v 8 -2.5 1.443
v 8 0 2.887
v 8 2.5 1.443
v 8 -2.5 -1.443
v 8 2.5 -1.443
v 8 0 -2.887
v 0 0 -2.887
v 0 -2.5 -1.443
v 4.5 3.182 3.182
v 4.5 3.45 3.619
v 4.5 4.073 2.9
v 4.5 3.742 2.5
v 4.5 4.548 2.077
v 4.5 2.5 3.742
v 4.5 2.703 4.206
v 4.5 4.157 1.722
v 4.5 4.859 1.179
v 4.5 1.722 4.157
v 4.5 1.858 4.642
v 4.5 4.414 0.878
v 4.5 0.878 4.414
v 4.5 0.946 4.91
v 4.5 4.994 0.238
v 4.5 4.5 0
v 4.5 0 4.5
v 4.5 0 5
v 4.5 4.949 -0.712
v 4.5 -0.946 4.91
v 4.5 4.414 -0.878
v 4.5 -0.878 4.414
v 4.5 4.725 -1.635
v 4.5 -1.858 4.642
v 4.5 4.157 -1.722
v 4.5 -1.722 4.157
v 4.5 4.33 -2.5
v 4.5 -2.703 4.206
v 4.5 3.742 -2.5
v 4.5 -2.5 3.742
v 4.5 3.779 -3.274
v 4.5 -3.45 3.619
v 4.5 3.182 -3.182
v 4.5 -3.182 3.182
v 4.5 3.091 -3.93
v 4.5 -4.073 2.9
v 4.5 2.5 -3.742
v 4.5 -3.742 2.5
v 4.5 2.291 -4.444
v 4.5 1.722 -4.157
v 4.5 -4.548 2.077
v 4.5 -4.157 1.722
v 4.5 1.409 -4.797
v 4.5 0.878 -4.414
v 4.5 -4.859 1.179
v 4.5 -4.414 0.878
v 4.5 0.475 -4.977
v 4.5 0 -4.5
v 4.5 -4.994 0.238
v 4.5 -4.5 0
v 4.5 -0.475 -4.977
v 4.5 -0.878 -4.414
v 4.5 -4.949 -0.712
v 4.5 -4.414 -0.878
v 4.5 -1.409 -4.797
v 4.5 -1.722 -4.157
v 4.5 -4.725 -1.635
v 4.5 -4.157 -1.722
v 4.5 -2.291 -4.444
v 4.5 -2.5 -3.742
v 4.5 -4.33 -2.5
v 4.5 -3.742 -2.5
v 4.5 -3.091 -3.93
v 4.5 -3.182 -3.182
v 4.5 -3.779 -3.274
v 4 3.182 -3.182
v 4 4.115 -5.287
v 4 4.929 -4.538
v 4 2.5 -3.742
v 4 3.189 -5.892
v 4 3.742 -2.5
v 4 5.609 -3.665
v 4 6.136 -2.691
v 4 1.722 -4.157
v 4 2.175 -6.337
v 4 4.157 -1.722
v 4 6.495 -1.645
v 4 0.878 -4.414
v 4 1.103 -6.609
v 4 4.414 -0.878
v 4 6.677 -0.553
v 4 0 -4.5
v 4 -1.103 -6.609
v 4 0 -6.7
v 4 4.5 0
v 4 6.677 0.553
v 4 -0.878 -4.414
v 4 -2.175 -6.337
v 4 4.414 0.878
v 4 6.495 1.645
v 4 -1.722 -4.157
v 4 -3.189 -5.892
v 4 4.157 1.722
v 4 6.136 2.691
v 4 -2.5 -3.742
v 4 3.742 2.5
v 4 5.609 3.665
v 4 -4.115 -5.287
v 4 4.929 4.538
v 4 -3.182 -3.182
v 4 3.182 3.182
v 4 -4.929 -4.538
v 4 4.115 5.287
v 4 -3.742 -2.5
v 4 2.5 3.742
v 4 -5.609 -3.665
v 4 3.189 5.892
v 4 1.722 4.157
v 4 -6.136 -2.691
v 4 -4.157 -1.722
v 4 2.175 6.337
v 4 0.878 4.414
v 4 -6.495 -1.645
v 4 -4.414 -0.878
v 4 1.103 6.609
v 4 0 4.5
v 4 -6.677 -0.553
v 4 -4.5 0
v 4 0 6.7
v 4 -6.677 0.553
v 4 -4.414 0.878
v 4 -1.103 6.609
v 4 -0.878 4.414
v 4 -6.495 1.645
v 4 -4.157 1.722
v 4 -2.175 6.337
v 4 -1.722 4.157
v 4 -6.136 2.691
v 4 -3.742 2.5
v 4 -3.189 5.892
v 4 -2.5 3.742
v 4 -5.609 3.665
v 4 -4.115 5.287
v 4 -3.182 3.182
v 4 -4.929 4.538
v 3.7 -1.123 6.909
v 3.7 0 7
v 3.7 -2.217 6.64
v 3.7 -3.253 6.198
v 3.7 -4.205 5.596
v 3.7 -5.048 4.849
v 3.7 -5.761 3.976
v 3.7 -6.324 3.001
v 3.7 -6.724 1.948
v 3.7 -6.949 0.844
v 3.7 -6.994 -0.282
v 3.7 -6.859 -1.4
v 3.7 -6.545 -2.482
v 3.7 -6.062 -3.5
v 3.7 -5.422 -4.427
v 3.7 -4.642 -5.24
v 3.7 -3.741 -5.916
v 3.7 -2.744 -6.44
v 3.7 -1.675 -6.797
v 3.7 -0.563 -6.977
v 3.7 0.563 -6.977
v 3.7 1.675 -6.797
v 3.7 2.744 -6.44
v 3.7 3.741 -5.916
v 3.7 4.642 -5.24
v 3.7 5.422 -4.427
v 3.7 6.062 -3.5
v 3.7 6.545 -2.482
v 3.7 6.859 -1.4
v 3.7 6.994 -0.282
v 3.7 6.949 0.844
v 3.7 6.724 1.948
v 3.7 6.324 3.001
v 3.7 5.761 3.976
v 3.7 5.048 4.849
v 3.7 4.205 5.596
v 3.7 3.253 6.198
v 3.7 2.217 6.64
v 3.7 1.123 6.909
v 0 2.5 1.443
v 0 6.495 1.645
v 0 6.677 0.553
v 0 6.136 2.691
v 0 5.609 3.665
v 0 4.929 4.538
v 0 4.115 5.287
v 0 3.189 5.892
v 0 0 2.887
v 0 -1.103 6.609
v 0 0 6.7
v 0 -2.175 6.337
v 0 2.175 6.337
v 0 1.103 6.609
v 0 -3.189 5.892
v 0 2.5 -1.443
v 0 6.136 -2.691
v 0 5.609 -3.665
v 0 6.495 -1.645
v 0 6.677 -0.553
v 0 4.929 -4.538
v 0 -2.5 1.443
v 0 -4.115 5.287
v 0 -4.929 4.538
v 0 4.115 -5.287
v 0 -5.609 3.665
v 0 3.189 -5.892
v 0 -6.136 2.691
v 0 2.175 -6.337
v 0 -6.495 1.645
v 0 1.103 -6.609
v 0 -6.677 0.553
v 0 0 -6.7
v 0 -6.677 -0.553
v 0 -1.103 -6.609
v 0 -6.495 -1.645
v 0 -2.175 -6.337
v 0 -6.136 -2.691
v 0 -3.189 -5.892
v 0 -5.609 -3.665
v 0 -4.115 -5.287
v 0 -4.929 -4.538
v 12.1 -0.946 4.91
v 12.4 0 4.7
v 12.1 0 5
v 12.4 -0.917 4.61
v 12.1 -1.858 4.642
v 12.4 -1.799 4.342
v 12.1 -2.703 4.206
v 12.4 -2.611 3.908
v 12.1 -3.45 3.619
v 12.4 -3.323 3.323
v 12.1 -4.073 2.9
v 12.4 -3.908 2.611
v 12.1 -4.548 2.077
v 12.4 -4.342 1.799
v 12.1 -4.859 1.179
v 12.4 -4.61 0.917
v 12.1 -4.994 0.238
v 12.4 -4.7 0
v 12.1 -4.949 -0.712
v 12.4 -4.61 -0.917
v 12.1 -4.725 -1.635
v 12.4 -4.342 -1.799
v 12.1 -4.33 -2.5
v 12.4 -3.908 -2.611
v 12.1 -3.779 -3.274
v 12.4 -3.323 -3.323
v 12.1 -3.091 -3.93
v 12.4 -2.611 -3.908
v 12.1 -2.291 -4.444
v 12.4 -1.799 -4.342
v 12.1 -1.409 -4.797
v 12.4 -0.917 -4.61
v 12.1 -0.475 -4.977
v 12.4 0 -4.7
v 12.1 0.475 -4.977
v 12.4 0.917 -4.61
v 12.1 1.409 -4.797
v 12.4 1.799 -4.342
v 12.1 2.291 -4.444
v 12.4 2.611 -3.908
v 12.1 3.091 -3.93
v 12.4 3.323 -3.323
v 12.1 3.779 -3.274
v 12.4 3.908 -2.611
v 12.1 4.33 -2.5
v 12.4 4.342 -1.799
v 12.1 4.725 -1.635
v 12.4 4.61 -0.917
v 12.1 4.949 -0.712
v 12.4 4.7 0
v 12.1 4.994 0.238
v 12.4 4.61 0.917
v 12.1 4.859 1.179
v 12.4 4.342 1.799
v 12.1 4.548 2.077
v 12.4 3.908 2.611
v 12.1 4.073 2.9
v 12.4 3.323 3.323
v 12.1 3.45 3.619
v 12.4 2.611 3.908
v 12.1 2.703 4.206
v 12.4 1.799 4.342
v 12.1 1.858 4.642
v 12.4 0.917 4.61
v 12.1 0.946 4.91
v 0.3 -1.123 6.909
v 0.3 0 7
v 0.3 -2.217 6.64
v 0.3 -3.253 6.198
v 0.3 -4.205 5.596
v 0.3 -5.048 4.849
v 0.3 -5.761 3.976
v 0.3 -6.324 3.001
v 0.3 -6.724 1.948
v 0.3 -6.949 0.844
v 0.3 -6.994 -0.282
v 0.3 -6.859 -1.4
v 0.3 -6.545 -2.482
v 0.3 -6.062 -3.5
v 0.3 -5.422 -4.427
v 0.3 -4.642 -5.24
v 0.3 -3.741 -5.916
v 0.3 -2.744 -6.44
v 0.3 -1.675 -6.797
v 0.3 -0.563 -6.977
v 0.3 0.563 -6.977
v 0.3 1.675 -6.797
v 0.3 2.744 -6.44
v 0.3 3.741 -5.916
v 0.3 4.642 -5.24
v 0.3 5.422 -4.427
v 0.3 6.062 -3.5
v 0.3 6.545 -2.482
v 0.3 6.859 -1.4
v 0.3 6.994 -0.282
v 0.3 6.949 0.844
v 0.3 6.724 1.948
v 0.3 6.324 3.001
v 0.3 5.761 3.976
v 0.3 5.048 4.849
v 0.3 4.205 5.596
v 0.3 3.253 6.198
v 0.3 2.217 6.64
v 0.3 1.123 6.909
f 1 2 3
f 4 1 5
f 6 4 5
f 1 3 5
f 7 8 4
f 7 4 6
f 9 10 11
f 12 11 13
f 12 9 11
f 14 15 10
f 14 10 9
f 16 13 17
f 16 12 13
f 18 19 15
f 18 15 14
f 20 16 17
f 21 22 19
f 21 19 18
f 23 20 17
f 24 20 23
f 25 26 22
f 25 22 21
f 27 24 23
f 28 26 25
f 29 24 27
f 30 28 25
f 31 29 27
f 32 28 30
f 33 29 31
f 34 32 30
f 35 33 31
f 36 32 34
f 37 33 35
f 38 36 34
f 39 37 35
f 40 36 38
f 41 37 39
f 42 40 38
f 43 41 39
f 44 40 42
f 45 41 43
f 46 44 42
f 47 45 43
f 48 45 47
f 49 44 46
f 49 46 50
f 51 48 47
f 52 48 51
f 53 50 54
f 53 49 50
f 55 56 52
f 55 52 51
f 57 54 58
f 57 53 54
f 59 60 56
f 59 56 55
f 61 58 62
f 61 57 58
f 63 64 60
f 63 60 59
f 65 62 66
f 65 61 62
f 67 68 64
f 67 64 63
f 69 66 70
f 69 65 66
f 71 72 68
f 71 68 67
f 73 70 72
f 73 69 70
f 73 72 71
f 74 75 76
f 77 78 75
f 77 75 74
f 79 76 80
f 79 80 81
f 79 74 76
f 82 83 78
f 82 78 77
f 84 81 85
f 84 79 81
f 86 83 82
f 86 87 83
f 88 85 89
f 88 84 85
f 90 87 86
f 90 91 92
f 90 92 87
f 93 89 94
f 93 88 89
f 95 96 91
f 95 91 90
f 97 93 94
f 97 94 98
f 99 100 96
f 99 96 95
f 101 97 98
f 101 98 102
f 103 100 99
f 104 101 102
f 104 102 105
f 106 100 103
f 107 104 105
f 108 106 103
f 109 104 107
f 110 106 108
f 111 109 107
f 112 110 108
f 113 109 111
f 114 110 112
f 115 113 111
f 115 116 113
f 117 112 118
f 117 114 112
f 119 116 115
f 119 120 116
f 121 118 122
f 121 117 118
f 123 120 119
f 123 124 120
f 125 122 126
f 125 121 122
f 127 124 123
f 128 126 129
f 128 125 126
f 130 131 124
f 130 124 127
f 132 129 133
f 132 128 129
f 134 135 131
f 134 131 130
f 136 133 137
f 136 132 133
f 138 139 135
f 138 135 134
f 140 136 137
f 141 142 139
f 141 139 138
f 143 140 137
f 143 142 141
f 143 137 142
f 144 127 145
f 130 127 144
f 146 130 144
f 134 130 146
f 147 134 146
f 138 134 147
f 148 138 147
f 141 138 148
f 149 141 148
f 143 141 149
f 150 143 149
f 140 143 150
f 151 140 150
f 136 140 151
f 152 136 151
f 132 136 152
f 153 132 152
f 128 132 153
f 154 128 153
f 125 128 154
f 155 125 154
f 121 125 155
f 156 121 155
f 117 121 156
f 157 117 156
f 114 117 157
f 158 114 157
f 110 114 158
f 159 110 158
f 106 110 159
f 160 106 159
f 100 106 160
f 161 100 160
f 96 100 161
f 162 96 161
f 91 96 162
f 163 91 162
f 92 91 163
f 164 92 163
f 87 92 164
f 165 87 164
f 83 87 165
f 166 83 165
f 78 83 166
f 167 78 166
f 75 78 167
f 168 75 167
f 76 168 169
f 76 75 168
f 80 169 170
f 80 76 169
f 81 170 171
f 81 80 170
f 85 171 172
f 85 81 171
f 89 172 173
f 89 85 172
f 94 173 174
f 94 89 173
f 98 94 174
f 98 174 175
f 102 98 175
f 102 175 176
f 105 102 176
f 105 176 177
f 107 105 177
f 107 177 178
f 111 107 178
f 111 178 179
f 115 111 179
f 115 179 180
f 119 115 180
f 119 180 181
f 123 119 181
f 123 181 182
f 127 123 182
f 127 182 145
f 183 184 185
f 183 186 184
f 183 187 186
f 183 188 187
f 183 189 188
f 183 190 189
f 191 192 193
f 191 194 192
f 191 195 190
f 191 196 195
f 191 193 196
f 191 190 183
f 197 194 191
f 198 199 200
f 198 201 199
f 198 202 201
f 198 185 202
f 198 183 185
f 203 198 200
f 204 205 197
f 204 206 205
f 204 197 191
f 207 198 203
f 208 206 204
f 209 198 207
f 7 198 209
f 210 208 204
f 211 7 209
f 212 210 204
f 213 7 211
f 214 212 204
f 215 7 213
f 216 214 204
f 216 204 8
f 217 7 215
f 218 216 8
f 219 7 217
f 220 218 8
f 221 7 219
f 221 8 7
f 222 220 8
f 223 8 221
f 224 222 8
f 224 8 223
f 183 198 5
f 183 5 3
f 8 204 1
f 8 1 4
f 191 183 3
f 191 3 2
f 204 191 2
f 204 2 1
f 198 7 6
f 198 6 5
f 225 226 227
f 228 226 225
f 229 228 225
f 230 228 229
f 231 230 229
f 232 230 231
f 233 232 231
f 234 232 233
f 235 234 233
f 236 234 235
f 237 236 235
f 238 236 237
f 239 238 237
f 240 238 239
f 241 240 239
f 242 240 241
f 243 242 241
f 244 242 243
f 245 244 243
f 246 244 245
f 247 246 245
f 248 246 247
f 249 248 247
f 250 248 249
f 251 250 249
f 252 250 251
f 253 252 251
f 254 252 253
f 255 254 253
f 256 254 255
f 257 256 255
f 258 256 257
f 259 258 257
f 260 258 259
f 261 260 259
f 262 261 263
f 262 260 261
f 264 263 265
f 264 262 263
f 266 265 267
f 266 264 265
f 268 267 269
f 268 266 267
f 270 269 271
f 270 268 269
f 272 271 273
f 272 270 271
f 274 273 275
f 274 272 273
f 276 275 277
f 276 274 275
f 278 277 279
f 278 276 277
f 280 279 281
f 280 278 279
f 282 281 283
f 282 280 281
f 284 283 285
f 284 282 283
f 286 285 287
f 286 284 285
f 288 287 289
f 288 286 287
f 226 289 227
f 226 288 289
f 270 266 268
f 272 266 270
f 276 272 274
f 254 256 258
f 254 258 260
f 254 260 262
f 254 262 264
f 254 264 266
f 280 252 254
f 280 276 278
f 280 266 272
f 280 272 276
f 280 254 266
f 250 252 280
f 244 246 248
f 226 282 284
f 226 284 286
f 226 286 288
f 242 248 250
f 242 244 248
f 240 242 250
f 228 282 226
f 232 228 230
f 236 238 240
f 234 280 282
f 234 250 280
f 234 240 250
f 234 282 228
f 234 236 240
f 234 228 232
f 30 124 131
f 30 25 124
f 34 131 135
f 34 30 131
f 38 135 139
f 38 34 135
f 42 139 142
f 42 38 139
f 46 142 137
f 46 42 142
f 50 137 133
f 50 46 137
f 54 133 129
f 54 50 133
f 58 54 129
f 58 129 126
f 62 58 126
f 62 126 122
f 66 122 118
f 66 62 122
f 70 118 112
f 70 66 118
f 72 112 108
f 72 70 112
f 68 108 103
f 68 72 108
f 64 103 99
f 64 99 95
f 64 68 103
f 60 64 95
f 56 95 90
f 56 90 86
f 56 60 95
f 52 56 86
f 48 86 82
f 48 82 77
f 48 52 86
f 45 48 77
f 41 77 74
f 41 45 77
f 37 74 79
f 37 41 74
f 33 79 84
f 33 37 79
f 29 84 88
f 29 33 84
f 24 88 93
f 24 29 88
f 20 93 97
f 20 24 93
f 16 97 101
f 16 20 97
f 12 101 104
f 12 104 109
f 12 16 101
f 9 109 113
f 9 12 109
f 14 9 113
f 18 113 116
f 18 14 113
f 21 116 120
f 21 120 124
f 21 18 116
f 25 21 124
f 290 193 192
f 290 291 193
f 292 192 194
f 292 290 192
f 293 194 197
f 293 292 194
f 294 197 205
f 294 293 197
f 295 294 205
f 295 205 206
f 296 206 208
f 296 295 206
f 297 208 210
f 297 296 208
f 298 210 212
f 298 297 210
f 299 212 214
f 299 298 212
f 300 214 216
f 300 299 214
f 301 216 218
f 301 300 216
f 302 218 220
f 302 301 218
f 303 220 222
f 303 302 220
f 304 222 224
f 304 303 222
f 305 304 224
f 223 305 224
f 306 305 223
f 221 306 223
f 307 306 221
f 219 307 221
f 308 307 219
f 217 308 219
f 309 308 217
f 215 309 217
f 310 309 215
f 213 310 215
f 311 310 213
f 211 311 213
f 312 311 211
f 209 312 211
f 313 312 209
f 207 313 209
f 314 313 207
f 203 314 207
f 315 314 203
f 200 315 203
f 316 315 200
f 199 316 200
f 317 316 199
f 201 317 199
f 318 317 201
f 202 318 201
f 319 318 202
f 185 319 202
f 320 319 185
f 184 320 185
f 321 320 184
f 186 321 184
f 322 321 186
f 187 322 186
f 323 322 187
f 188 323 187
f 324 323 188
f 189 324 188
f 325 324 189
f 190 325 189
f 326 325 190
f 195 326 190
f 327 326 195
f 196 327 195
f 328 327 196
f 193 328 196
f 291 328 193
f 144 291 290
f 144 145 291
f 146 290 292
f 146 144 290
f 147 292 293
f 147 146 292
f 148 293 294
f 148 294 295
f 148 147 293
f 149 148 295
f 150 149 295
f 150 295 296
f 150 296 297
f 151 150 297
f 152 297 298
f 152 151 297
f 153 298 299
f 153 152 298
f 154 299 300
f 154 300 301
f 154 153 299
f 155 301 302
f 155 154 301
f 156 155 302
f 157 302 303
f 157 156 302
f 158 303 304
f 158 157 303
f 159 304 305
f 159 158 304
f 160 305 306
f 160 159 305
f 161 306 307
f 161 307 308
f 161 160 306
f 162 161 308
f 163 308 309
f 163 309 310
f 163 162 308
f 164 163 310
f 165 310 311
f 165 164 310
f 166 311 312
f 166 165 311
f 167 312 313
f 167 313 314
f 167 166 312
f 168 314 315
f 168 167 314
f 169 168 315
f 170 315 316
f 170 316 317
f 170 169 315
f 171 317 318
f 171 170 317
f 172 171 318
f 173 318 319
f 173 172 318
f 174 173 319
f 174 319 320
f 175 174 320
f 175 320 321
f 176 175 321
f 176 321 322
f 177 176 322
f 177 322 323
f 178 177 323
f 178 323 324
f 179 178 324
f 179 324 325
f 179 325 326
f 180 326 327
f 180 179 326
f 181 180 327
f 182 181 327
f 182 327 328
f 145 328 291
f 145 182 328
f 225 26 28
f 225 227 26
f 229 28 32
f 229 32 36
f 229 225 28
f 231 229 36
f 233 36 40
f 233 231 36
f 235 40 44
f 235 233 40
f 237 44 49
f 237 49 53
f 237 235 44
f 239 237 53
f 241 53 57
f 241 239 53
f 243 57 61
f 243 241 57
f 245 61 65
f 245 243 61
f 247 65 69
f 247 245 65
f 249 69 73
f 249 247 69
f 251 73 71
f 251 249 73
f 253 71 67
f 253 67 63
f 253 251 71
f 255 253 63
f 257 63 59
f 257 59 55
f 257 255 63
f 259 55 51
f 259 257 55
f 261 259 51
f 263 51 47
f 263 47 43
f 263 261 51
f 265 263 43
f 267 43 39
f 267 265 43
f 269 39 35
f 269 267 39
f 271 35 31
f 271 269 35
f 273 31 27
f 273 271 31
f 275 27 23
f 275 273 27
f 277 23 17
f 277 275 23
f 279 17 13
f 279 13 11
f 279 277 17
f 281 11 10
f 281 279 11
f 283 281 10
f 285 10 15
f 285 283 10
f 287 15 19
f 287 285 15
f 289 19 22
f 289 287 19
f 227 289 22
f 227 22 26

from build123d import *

# Parameters (mm, degrees)
ENL_V_MAT_EXTRU_1_DEPTH = 8


with BuildPart() as part:
    # Esquisse1 → Révolution1 (revolve)
    with BuildSketch(Plane.XY, mode=Mode.PRIVATE) as r_volution1_sk:
        Polygon((0, 0), (0, 6.7), (0.3, 7), (3.7, 7), (4, 6.7), (4, 4.5), (4.5, 4.5), (4.5, 5), (12.1, 5), (12.4, 4.7), (12.4, 0), align=None)
    revolve(r_volution1_sk.sketch.rotate(Axis((-14.206779661, 0, 0), (1, 0, 0)), 90), axis=Axis((-14.206779661, 0, 0), (1, 0, 0)))

    # Esquisse2 → Enlèv. mat.-Extru.1 (cut)
    with BuildSketch(Plane.ZY):
        Polygon((-1.443375673, 2.5), (1.443375673, 2.5), (2.886751346, 0), (1.443375673, -2.5), (-1.443375673, -2.5), (-2.886751346, 0), align=None)
    extrude(amount=-ENL_V_MAT_EXTRU_1_DEPTH, mode=Mode.SUBTRACT)


solid = part.part
